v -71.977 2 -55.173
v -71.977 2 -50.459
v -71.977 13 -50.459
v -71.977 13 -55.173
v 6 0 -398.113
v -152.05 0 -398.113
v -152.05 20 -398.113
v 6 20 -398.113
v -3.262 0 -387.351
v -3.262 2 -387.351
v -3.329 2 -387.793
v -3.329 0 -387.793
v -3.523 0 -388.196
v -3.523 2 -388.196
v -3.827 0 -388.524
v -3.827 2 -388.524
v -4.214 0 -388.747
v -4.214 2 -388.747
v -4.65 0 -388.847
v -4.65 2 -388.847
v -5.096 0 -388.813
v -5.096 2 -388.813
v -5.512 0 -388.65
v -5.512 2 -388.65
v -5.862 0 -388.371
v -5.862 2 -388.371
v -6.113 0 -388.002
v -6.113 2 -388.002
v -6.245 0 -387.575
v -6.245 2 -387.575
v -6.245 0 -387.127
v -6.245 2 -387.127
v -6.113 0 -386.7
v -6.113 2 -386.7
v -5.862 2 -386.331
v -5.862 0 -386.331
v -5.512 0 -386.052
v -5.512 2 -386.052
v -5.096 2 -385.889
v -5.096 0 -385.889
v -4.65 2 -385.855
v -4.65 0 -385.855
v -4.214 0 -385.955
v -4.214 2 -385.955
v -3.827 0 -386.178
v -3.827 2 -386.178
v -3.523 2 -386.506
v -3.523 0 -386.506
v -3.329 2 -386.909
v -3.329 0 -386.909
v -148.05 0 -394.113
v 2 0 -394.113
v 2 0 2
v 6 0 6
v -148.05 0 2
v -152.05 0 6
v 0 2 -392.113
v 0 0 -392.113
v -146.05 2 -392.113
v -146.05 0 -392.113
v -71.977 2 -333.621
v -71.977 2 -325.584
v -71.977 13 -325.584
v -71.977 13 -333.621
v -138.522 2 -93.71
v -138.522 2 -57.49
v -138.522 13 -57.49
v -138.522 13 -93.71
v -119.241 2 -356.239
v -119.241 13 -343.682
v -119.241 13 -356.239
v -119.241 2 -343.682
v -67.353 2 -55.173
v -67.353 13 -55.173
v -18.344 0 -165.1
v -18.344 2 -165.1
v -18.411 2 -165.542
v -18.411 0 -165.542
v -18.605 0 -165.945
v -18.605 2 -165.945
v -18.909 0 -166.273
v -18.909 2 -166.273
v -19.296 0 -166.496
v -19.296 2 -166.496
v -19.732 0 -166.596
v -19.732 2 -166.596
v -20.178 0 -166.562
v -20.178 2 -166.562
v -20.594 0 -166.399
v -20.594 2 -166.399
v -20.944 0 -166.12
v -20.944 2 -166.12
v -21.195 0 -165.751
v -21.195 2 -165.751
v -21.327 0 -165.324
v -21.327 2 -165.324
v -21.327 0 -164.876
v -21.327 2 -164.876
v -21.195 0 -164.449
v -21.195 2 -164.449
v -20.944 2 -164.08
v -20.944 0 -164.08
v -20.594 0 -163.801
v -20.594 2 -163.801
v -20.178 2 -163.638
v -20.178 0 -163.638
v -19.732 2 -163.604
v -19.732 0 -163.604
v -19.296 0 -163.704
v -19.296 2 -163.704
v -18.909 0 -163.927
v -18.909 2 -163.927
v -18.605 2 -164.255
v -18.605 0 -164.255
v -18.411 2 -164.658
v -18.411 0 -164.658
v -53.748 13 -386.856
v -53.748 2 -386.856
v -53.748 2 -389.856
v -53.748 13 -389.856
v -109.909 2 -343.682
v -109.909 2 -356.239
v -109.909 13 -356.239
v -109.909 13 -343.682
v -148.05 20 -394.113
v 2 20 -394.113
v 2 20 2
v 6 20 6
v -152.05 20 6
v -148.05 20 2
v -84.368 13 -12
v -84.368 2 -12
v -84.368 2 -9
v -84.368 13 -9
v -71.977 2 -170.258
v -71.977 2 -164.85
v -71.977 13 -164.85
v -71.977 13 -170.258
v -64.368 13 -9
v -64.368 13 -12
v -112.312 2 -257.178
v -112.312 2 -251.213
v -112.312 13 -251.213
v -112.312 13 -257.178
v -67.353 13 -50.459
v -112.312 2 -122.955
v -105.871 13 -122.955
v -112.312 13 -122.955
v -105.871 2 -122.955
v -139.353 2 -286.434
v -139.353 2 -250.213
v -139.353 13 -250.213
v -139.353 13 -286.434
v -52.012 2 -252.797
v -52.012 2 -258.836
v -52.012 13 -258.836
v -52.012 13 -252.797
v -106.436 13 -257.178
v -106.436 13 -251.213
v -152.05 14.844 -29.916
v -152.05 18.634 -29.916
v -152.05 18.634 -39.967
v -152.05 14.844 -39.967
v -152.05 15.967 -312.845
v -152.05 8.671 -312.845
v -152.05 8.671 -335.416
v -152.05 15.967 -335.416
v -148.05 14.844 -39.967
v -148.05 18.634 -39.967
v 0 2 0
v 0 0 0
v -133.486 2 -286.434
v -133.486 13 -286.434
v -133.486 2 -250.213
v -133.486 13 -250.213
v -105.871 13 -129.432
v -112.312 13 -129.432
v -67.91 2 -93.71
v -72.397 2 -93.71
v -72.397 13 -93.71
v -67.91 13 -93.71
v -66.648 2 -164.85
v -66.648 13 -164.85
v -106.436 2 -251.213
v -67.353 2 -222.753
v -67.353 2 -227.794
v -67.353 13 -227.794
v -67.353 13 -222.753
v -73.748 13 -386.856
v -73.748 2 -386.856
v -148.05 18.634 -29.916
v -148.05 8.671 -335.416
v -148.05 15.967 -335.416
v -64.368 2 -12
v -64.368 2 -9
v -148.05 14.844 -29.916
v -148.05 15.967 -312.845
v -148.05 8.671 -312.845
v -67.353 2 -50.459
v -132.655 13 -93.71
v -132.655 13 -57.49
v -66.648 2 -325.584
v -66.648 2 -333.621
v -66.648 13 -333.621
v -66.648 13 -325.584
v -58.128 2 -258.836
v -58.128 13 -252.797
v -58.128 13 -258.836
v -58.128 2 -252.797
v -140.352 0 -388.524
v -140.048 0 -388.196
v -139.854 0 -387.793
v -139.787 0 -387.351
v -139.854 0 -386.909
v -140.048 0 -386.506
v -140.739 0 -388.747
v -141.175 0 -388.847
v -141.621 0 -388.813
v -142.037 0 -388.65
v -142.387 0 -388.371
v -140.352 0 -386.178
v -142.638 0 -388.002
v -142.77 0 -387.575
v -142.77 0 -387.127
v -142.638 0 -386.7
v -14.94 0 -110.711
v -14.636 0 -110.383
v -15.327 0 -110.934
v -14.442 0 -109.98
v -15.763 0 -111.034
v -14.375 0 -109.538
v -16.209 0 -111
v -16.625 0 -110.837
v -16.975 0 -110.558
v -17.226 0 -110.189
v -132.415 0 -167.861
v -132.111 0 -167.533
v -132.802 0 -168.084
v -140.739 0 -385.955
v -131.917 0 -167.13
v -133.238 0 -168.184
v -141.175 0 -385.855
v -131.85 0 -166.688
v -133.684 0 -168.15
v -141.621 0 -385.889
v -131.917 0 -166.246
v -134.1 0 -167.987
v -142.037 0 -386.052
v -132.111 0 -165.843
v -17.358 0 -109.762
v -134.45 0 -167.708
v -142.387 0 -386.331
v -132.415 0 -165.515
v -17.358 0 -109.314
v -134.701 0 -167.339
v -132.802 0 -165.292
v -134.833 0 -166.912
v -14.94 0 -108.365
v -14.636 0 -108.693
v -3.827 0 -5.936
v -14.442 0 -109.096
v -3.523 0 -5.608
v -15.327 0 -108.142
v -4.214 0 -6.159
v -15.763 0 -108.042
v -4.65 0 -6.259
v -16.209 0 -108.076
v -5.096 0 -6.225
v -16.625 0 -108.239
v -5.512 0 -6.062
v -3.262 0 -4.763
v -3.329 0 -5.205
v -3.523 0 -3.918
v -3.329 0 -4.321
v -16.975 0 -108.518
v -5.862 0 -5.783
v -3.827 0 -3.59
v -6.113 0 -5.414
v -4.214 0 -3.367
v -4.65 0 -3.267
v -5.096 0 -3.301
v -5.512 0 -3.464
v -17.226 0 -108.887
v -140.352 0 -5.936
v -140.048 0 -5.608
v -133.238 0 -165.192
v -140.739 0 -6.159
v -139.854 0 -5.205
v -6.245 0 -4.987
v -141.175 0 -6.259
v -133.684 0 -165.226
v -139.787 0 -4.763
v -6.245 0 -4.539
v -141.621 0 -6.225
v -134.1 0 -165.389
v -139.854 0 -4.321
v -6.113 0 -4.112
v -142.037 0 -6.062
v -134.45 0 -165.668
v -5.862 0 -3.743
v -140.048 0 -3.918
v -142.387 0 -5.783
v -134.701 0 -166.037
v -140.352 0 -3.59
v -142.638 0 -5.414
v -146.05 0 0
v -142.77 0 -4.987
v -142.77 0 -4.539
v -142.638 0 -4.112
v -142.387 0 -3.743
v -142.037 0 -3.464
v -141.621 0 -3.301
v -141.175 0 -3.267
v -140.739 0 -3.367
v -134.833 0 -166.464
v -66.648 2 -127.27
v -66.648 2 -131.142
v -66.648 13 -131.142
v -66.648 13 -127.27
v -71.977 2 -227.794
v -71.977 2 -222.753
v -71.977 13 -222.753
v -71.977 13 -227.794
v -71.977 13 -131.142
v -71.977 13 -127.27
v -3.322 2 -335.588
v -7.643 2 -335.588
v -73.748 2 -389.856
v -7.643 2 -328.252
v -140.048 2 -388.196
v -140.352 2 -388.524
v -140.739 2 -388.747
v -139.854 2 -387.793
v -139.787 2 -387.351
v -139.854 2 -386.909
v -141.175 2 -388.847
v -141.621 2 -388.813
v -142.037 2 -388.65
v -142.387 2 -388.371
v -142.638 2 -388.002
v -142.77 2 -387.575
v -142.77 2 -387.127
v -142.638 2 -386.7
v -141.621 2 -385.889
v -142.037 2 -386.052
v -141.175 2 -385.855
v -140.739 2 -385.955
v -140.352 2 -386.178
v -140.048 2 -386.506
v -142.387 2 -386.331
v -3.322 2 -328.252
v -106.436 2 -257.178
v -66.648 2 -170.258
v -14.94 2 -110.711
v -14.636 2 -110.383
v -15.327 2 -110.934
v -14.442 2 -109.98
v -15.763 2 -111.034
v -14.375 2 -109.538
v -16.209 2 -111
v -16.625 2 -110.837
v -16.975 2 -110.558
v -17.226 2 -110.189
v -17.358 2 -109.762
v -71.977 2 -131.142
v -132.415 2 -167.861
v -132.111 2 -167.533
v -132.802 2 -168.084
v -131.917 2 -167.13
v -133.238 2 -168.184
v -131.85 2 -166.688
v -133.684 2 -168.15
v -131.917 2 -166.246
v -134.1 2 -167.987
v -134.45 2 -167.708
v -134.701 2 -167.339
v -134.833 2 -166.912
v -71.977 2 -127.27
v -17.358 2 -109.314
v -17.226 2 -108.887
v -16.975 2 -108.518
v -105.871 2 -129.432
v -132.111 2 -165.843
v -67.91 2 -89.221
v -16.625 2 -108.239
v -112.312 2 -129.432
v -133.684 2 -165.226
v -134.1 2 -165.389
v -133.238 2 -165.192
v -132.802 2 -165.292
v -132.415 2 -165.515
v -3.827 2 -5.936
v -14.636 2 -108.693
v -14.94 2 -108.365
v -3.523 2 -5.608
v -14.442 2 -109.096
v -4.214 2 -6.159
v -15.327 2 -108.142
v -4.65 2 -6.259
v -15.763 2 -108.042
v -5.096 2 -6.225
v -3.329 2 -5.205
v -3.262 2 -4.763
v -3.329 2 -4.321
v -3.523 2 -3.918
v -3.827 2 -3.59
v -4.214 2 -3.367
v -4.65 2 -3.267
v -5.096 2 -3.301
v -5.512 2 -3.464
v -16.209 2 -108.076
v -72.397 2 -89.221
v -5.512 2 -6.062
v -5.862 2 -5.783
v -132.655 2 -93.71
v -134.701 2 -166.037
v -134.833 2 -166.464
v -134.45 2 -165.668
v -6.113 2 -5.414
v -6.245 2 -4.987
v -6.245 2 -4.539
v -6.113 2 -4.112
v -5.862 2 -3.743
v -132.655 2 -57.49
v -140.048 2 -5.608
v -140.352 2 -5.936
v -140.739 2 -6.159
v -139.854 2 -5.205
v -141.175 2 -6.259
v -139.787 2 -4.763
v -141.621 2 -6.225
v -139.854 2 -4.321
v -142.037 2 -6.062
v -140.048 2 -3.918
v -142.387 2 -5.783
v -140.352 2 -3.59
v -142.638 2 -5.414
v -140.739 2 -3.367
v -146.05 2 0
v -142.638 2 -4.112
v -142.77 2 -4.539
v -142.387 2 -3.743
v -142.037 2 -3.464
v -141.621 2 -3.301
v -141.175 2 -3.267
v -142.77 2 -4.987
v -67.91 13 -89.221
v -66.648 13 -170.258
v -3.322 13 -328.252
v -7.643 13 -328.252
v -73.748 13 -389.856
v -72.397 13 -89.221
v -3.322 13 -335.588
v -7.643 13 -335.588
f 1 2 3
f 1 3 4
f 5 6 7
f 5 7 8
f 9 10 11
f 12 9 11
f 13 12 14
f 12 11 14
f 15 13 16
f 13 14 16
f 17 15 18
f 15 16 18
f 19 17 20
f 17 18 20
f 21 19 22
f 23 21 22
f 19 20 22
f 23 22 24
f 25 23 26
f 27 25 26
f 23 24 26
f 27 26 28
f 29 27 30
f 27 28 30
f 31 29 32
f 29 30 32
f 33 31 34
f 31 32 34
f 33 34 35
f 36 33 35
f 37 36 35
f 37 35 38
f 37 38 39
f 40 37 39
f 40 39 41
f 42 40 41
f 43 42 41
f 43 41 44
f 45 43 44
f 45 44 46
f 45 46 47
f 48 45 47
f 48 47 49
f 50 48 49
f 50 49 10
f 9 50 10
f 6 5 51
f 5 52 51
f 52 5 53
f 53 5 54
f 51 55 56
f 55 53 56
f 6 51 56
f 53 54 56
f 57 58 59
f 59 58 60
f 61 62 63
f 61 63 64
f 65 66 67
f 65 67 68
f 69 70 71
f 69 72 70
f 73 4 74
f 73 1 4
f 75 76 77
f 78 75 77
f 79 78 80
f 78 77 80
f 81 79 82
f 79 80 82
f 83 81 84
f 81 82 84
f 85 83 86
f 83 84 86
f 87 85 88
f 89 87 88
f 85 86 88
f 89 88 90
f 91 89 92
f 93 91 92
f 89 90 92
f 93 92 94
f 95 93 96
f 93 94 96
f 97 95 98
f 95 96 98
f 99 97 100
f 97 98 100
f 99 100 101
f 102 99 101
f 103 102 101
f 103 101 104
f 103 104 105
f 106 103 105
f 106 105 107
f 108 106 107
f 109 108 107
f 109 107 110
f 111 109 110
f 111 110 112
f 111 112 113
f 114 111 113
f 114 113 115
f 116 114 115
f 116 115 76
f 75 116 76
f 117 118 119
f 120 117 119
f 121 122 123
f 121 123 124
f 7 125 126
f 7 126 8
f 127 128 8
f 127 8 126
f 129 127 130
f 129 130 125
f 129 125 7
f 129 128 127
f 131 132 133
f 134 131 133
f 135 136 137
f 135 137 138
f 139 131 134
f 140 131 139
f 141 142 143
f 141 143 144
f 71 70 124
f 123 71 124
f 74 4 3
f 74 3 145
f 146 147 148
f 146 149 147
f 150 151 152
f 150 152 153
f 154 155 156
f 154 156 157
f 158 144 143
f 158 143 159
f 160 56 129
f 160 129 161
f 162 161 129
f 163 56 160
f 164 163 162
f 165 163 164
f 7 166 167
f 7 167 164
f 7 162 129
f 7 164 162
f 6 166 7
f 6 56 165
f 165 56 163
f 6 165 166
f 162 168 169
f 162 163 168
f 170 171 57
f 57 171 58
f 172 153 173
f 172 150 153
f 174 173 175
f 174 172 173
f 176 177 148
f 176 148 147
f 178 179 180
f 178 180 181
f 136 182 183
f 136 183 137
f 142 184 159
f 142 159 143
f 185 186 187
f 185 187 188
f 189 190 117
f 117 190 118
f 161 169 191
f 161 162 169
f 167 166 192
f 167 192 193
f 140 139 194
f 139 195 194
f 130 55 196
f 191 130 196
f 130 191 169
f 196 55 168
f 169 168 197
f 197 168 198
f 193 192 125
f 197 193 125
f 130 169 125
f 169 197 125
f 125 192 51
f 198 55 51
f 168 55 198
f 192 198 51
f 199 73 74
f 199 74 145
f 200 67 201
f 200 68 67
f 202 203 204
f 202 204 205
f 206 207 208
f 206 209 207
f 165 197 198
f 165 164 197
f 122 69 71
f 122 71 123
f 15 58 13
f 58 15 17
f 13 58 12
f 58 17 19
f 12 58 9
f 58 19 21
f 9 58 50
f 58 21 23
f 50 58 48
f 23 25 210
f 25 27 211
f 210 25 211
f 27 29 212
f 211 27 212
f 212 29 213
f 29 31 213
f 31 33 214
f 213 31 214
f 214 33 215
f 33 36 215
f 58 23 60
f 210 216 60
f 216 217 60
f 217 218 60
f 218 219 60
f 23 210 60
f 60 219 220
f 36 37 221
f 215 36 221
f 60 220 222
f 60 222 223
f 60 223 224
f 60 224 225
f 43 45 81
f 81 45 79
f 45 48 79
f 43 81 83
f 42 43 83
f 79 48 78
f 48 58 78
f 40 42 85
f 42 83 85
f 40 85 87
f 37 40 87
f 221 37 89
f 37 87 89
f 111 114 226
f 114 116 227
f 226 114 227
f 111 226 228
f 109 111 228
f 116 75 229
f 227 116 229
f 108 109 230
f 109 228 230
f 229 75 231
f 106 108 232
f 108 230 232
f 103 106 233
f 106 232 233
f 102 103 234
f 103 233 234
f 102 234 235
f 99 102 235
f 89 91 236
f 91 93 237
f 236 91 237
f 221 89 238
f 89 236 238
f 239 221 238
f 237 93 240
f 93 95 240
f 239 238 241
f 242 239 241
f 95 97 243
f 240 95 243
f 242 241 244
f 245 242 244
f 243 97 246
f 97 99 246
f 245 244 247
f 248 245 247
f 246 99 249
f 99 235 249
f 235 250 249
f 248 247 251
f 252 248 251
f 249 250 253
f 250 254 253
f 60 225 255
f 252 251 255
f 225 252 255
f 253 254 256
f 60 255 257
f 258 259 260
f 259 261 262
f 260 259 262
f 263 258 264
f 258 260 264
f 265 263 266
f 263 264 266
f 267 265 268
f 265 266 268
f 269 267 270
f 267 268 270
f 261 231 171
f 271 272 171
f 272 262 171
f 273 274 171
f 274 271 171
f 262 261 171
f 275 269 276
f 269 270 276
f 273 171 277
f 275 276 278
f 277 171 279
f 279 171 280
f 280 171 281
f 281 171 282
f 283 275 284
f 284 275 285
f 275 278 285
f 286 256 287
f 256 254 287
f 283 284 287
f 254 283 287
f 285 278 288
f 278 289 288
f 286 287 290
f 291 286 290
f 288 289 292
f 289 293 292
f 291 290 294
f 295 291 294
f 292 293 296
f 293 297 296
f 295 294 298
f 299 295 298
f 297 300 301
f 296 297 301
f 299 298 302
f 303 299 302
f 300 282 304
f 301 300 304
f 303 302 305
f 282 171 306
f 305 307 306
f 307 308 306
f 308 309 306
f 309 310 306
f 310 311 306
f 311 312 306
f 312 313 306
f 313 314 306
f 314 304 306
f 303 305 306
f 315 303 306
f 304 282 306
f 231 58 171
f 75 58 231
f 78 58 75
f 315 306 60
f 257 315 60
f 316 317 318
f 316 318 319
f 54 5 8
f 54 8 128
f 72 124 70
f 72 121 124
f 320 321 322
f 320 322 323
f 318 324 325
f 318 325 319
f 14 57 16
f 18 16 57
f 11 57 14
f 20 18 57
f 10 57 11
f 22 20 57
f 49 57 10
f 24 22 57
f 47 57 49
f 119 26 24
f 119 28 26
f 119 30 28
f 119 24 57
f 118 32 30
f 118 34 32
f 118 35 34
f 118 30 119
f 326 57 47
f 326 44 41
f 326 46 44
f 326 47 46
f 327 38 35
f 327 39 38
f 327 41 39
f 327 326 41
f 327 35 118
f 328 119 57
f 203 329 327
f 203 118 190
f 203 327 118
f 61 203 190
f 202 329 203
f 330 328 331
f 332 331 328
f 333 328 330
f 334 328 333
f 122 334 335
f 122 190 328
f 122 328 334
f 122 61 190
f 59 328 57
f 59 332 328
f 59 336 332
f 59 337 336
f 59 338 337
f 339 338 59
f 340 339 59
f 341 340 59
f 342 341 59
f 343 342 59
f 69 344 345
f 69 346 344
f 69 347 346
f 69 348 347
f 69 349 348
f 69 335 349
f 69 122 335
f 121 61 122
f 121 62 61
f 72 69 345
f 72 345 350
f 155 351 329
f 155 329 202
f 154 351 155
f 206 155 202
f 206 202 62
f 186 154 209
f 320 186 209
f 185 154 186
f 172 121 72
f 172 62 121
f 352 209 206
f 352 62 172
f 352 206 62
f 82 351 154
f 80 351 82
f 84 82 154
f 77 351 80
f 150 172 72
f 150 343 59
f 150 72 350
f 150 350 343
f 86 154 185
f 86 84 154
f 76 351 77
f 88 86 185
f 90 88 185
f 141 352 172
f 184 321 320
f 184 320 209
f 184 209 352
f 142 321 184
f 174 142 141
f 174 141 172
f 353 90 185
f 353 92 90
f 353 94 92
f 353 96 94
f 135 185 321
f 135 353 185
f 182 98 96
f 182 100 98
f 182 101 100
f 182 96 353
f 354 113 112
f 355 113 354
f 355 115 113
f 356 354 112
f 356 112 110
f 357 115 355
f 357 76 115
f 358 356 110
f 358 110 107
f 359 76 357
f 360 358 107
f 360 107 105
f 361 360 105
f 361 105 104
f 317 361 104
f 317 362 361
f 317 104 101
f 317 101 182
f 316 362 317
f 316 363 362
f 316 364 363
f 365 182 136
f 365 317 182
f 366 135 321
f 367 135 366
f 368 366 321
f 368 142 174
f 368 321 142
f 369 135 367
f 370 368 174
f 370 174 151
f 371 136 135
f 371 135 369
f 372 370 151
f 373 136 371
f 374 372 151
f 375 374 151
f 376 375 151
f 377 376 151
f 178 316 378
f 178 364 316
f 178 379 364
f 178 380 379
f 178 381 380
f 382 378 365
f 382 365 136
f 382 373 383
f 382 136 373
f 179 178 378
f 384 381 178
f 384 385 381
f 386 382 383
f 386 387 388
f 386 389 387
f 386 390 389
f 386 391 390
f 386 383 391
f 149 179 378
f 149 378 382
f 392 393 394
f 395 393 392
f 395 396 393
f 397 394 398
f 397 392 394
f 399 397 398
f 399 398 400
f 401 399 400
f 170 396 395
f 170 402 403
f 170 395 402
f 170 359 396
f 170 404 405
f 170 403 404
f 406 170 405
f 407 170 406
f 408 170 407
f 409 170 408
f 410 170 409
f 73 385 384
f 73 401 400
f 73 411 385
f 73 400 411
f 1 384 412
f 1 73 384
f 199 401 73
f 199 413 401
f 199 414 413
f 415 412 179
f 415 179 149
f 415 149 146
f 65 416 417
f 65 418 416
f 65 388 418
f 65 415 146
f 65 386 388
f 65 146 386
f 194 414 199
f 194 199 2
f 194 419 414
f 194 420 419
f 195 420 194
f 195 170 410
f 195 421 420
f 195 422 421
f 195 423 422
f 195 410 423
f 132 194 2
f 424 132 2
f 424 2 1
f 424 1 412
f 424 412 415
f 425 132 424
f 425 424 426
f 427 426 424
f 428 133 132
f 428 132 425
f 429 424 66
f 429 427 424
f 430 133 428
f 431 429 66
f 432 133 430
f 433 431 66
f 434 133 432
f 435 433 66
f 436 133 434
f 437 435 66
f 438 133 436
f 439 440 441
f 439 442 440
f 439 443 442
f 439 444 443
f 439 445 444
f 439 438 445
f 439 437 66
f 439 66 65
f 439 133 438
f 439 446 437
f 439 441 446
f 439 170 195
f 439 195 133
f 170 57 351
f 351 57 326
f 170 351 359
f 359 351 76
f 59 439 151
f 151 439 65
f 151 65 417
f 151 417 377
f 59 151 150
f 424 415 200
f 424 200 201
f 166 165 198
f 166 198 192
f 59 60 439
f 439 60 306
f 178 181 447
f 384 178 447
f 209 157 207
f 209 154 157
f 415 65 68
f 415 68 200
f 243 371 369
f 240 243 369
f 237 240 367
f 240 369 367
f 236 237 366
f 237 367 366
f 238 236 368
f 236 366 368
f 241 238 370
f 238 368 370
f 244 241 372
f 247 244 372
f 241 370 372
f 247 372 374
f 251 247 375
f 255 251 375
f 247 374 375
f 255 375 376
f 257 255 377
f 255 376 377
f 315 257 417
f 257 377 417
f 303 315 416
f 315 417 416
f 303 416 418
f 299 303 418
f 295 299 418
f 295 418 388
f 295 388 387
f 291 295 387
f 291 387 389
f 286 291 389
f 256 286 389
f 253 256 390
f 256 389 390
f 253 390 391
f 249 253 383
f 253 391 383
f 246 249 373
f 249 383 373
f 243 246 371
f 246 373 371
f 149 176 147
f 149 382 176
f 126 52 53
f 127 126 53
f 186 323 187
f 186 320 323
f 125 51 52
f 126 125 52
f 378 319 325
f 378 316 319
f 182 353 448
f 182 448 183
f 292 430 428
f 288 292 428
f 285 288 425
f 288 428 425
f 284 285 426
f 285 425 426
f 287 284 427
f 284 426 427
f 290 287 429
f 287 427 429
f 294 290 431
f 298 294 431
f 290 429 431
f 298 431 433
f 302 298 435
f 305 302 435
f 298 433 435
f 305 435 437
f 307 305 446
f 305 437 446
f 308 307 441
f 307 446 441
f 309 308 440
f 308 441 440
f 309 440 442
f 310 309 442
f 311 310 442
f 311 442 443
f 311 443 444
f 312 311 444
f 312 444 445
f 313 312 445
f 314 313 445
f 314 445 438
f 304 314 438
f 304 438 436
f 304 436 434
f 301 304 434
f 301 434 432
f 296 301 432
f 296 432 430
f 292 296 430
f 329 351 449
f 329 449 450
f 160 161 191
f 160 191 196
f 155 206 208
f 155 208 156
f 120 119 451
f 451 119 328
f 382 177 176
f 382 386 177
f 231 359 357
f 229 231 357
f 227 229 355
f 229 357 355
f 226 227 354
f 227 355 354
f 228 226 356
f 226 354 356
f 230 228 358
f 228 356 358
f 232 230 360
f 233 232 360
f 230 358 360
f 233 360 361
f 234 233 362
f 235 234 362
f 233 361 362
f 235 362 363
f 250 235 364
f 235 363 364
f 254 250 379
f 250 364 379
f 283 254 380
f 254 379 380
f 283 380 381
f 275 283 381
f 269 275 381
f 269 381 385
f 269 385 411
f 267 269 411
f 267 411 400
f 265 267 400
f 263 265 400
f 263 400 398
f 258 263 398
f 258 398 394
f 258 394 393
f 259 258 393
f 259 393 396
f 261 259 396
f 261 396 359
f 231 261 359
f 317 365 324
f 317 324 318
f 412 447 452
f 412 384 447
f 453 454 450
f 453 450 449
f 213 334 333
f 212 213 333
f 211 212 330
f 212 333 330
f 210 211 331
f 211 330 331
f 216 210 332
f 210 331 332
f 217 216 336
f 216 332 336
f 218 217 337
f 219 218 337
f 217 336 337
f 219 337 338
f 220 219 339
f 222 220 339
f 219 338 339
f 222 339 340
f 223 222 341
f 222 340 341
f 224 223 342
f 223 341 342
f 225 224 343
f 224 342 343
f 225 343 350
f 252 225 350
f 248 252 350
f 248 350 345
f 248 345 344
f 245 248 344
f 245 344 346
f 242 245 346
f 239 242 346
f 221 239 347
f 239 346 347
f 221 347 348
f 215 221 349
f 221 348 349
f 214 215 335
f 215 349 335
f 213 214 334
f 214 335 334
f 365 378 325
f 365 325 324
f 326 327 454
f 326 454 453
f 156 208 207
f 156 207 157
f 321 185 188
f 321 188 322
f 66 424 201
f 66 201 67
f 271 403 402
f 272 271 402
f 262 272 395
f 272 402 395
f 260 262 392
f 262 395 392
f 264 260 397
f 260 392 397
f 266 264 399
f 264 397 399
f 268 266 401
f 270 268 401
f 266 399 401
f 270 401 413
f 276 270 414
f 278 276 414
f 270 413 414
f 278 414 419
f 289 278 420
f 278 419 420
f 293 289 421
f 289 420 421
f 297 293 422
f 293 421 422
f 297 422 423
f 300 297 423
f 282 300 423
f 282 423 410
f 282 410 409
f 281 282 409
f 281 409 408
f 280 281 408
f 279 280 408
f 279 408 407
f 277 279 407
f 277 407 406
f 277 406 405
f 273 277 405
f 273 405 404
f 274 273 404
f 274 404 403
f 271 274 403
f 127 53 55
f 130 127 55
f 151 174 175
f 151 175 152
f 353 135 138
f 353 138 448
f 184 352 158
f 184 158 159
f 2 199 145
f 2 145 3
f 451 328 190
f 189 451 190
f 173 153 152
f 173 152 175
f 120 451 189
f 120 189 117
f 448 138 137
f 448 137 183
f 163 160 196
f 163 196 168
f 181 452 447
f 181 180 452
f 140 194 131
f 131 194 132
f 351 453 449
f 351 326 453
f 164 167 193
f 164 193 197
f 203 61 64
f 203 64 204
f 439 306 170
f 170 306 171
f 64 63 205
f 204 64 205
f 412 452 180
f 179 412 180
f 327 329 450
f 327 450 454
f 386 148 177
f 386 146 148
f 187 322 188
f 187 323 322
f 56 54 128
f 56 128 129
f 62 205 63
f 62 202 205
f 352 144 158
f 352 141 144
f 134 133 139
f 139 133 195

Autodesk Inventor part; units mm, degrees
ref_plane "YZ Plane" through (0, 0, 0) normal (1, 0, 0) x (0, 1, 0)
ref_plane "XZ Plane" through (0, 0, 0) normal (0, 1, 0) x (-1, 0, 0)
ref_plane "XY Plane" through (0, 0, 0) normal (0, 0, 1) x (1, 0, 0)
sketch "Sketch1" plane through (0, 0, 0) normal (0, 1, 0) x (-1, 0, 0)
  line L0 (0, 0) -> (0, -392.113)
  line L1 (0, -392.113) -> (146.05, -392.113)
  line L2 (146.05, -392.113) -> (146.05, 0)
  line L3 (146.05, 0) -> (0, 0)
  line L4 (148.05, 2) -> (148.05, -394.113)
  line L5 (148.05, -394.113) -> (-2, -394.113)
  line L6 (-2, -394.113) -> (-2, 2)
  line L7 (-2, 2) -> (148.05, 2)
  line L8 (152.05, 6) -> (152.05, -398.113)
  line L9 (152.05, -398.113) -> (-6, -398.113)
  line L10 (-6, -398.113) -> (-6, 6)
  line L11 (-6, 6) -> (152.05, 6)
  dimension "d0" = 146.05
  dimension "d1" = 392.113
  dimension "d2" = 2
  dimension "d3" = 4
extrude "Extrusion1" add sketch "Sketch1" along normal blind 2 contours L3 L2 L1 L0
sketch "Sketch2" plane through (0, 2, 0) normal (0, 1, 0) x (1, 0, 0)
  circle A0 centre (-141.287, 4.763) radius 1.5
  line L0 (-146.05, 392.113) -> (-146.05, 0) projected
  line L1 (-146.05, 0) -> (0, 0) projected
  circle A1 centre (-4.762, 4.763) radius 1.5
  circle A2 centre (-141.287, 387.351) radius 1.5
  circle A3 centre (-4.762, 387.351) radius 1.5
  circle A4 centre (-15.875, 109.538) radius 1.5
  circle A5 centre (-19.844, 165.1) radius 1.5
  line L2 (0, 0) -> (0, 392.113) projected
  circle A6 centre (-133.35, 166.688) radius 1.5
  dimension "d6" = 3
  dimension "d7" = 4.763
  dimension "d8" = 4.763
  dimension "d11" = 136.525
  dimension "d14" = 382.588
  dimension "d19" = 3
  dimension "d20" = 3
  dimension "d21" = 109.538
  dimension "d22" = 15.875
  dimension "d23" = 19.844
  dimension "d24" = 165.1
  dimension "d25" = 3
  dimension "d26" = 12.7
  dimension "d27" = 166.688
extrude "Extrusion2" cut sketch "Sketch2" against normal through all contours A0 | A1 | A2 | A3
extrude "Extrusion3" cut sketch "Sketch2" against normal through all contours A4 | A5 | A6
sketch "Sketch3" plane through (0, 2, 0) normal (0, 1, 0) x (1, 0, 0)
  line L0 (-84.3679, 9) -> (-64.3679, 9)
  line L1 (-64.3679, 9) -> (-64.3679, 12)
  line L2 (-64.3679, 12) -> (-84.3679, 12)
  line L3 (-84.3679, 12) -> (-84.3679, 9)
  line L4 (-146.05, 0) -> (0, 0) projected
  line L5 (-73.7475, 386.8564) -> (-53.7475, 386.8564)
  line L6 (-53.7475, 386.8564) -> (-53.7475, 389.8564)
  line L7 (-53.7475, 389.8564) -> (-73.7475, 389.8564)
  line L8 (-73.7475, 389.8564) -> (-73.7475, 386.8564)
  line L9 (-138.522, 93.7104) -> (-132.6553, 93.7104)
  line L10 (-132.6553, 93.7104) -> (-132.6553, 57.4897)
  line L11 (-132.6553, 57.4897) -> (-138.522, 57.4897)
  line L12 (-138.522, 57.4897) -> (-138.522, 93.7104)
  line L13 (-139.3528, 286.4335) -> (-133.4861, 286.4335)
  line L14 (-133.4861, 286.4335) -> (-133.4861, 250.2128)
  line L15 (-133.4861, 250.2128) -> (-139.3528, 250.2128)
  line L16 (-139.3528, 250.2128) -> (-139.3528, 286.4335)
  line L17 (-72.3966, 93.7104) -> (-67.9097, 93.7104)
  line L18 (-67.9097, 93.7104) -> (-67.9097, 89.2212)
  line L19 (-67.9097, 89.2212) -> (-72.3966, 89.2212)
  line L20 (-72.3966, 89.2212) -> (-72.3966, 93.7104)
  line L21 (-58.1279, 258.8361) -> (-52.0116, 258.8361)
  line L22 (-52.0116, 258.8361) -> (-52.0116, 252.7967)
  line L23 (-52.0116, 252.7967) -> (-58.1279, 252.7967)
  line L24 (-58.1279, 252.7967) -> (-58.1279, 258.8361)
  line L25 (-7.6429, 335.5882) -> (-3.3218, 335.5882)
  line L26 (-3.3218, 335.5882) -> (-3.3218, 328.2515)
  line L27 (-3.3218, 328.2515) -> (-7.6429, 328.2515)
  line L28 (-7.6429, 328.2515) -> (-7.6429, 335.5882)
  line L29 (-119.2414, 356.2386) -> (-109.9087, 356.2386)
  line L30 (-109.9087, 356.2386) -> (-109.9087, 343.6818)
  line L31 (-109.9087, 343.6818) -> (-119.2414, 343.6818)
  line L32 (-119.2414, 343.6818) -> (-119.2414, 356.2386)
  line L33 (-71.9772, 55.173) -> (-67.3534, 55.173)
  line L34 (-67.3534, 55.173) -> (-67.3534, 50.4586)
  line L35 (-67.3534, 50.4586) -> (-71.9772, 50.4586)
  line L36 (-71.9772, 50.4586) -> (-71.9772, 55.173)
  line L37 (-112.3115, 129.4321) -> (-105.8709, 129.4321)
  line L38 (-105.8709, 129.4321) -> (-105.8709, 122.9553)
  line L39 (-105.8709, 122.9553) -> (-112.3115, 122.9553)
  line L40 (-112.3115, 122.9553) -> (-112.3115, 129.4321)
  line L41 (-112.3115, 257.1779) -> (-106.4365, 257.1779)
  line L42 (-106.4365, 257.1779) -> (-106.4365, 251.2133)
  line L43 (-106.4365, 251.2133) -> (-112.3115, 251.2133)
  line L44 (-112.3115, 251.2133) -> (-112.3115, 257.1779)
  line L45 (-71.9772, 131.1422) -> (-66.6479, 131.1422)
  line L46 (-66.6479, 131.1422) -> (-66.6479, 127.27)
  line L47 (-66.6479, 127.27) -> (-71.9772, 127.27)
  line L48 (-71.9772, 127.27) -> (-71.9772, 131.1422)
  line L49 (-71.9772, 170.2584) -> (-66.6479, 170.2584)
  line L50 (-66.6479, 170.2584) -> (-66.6479, 164.8496)
  line L51 (-66.6479, 164.8496) -> (-71.9772, 164.8496)
  line L52 (-71.9772, 164.8496) -> (-71.9772, 170.2584)
  line L53 (-71.9772, 227.794) -> (-67.3534, 227.794)
  line L54 (-67.3534, 227.794) -> (-67.3534, 222.7529)
  line L55 (-67.3534, 222.7529) -> (-71.9772, 222.7529)
  line L56 (-71.9772, 222.7529) -> (-71.9772, 227.794)
  line L57 (-71.9772, 333.6214) -> (-66.6479, 333.6214)
  line L58 (-66.6479, 333.6214) -> (-66.6479, 325.5838)
  line L59 (-66.6479, 325.5838) -> (-71.9772, 325.5838)
  line L60 (-71.9772, 325.5838) -> (-71.9772, 333.6214)
  dimension "d30" = 20
  dimension "d31" = 3
  dimension "d32" = 12
  dimension "d35" = 20
  dimension "d36" = 3
extrude "Extrusion4" add sketch "Sketch3" along normal blind 11 contours L3 L2 L1 L0
extrude "Extrusion5" add sketch "Sketch3" along normal blind 11 contours L8 L7 L6 L5 | L9 L10 L11 L12 | L13 L14 L15 L16 | L17 L18 L19 L20 | L21 L22 L23 L24 | L25 L26 L27 L28 | L29 L30 L31 L32 | L33 L34 L35 L36 | L37 L38 L39 L40 | L41 L42 L43 L44 | L45 L46 L47 L48 | L49 L50 L51 L52 | L53 L54 L55 L56 | L57 L58 L59 L60
extrude "Extrusion6" add sketch "Sketch1" along normal blind 20 contours L8 L9 L10 L11
sketch "Sketch4" plane through (-152.05, 0, -398.113) normal (-1, 0, 0) x (0, 0, 1)
  line L0 (358.1458, 18.6338) -> (368.1975, 18.6338)
  line L1 (368.1975, 18.6338) -> (368.1975, 14.8444)
  line L2 (368.1975, 14.8444) -> (358.1458, 14.8444)
  line L3 (358.1458, 14.8444) -> (358.1458, 18.6338)
  point P0 (398.113, 0)
  point P1 (212.9873, 26.1445)
  point P2 (212.9873, 26.1445)
  point P3 (212.9873, 26.1445)
extrude "Extrusion7" cut sketch "Sketch4" against normal blind 20
sketch "Sketch5" plane through (-152.05, 0, -398.113) normal (-1, 0, 0) x (0, 0, 1)
  line L0 (6, 2) -> (398.113, 2) projected
  line L1 (85.2683, 2) -> (62.6972, 2)
  line L2 (62.6972, 15.9667) -> (85.2683, 15.9667)
  line L3 (85.2683, 15.9667) -> (85.2683, 8.6713)
  line L4 (85.2683, 8.6713) -> (62.6972, 8.6713)
  line L5 (62.6972, 8.6713) -> (62.6972, 15.9667)
  point P0 (398.113, 0)
extrude "Extrusion10" cut sketch "Sketch5" against normal blind 20
properties part number "bottom_case"
